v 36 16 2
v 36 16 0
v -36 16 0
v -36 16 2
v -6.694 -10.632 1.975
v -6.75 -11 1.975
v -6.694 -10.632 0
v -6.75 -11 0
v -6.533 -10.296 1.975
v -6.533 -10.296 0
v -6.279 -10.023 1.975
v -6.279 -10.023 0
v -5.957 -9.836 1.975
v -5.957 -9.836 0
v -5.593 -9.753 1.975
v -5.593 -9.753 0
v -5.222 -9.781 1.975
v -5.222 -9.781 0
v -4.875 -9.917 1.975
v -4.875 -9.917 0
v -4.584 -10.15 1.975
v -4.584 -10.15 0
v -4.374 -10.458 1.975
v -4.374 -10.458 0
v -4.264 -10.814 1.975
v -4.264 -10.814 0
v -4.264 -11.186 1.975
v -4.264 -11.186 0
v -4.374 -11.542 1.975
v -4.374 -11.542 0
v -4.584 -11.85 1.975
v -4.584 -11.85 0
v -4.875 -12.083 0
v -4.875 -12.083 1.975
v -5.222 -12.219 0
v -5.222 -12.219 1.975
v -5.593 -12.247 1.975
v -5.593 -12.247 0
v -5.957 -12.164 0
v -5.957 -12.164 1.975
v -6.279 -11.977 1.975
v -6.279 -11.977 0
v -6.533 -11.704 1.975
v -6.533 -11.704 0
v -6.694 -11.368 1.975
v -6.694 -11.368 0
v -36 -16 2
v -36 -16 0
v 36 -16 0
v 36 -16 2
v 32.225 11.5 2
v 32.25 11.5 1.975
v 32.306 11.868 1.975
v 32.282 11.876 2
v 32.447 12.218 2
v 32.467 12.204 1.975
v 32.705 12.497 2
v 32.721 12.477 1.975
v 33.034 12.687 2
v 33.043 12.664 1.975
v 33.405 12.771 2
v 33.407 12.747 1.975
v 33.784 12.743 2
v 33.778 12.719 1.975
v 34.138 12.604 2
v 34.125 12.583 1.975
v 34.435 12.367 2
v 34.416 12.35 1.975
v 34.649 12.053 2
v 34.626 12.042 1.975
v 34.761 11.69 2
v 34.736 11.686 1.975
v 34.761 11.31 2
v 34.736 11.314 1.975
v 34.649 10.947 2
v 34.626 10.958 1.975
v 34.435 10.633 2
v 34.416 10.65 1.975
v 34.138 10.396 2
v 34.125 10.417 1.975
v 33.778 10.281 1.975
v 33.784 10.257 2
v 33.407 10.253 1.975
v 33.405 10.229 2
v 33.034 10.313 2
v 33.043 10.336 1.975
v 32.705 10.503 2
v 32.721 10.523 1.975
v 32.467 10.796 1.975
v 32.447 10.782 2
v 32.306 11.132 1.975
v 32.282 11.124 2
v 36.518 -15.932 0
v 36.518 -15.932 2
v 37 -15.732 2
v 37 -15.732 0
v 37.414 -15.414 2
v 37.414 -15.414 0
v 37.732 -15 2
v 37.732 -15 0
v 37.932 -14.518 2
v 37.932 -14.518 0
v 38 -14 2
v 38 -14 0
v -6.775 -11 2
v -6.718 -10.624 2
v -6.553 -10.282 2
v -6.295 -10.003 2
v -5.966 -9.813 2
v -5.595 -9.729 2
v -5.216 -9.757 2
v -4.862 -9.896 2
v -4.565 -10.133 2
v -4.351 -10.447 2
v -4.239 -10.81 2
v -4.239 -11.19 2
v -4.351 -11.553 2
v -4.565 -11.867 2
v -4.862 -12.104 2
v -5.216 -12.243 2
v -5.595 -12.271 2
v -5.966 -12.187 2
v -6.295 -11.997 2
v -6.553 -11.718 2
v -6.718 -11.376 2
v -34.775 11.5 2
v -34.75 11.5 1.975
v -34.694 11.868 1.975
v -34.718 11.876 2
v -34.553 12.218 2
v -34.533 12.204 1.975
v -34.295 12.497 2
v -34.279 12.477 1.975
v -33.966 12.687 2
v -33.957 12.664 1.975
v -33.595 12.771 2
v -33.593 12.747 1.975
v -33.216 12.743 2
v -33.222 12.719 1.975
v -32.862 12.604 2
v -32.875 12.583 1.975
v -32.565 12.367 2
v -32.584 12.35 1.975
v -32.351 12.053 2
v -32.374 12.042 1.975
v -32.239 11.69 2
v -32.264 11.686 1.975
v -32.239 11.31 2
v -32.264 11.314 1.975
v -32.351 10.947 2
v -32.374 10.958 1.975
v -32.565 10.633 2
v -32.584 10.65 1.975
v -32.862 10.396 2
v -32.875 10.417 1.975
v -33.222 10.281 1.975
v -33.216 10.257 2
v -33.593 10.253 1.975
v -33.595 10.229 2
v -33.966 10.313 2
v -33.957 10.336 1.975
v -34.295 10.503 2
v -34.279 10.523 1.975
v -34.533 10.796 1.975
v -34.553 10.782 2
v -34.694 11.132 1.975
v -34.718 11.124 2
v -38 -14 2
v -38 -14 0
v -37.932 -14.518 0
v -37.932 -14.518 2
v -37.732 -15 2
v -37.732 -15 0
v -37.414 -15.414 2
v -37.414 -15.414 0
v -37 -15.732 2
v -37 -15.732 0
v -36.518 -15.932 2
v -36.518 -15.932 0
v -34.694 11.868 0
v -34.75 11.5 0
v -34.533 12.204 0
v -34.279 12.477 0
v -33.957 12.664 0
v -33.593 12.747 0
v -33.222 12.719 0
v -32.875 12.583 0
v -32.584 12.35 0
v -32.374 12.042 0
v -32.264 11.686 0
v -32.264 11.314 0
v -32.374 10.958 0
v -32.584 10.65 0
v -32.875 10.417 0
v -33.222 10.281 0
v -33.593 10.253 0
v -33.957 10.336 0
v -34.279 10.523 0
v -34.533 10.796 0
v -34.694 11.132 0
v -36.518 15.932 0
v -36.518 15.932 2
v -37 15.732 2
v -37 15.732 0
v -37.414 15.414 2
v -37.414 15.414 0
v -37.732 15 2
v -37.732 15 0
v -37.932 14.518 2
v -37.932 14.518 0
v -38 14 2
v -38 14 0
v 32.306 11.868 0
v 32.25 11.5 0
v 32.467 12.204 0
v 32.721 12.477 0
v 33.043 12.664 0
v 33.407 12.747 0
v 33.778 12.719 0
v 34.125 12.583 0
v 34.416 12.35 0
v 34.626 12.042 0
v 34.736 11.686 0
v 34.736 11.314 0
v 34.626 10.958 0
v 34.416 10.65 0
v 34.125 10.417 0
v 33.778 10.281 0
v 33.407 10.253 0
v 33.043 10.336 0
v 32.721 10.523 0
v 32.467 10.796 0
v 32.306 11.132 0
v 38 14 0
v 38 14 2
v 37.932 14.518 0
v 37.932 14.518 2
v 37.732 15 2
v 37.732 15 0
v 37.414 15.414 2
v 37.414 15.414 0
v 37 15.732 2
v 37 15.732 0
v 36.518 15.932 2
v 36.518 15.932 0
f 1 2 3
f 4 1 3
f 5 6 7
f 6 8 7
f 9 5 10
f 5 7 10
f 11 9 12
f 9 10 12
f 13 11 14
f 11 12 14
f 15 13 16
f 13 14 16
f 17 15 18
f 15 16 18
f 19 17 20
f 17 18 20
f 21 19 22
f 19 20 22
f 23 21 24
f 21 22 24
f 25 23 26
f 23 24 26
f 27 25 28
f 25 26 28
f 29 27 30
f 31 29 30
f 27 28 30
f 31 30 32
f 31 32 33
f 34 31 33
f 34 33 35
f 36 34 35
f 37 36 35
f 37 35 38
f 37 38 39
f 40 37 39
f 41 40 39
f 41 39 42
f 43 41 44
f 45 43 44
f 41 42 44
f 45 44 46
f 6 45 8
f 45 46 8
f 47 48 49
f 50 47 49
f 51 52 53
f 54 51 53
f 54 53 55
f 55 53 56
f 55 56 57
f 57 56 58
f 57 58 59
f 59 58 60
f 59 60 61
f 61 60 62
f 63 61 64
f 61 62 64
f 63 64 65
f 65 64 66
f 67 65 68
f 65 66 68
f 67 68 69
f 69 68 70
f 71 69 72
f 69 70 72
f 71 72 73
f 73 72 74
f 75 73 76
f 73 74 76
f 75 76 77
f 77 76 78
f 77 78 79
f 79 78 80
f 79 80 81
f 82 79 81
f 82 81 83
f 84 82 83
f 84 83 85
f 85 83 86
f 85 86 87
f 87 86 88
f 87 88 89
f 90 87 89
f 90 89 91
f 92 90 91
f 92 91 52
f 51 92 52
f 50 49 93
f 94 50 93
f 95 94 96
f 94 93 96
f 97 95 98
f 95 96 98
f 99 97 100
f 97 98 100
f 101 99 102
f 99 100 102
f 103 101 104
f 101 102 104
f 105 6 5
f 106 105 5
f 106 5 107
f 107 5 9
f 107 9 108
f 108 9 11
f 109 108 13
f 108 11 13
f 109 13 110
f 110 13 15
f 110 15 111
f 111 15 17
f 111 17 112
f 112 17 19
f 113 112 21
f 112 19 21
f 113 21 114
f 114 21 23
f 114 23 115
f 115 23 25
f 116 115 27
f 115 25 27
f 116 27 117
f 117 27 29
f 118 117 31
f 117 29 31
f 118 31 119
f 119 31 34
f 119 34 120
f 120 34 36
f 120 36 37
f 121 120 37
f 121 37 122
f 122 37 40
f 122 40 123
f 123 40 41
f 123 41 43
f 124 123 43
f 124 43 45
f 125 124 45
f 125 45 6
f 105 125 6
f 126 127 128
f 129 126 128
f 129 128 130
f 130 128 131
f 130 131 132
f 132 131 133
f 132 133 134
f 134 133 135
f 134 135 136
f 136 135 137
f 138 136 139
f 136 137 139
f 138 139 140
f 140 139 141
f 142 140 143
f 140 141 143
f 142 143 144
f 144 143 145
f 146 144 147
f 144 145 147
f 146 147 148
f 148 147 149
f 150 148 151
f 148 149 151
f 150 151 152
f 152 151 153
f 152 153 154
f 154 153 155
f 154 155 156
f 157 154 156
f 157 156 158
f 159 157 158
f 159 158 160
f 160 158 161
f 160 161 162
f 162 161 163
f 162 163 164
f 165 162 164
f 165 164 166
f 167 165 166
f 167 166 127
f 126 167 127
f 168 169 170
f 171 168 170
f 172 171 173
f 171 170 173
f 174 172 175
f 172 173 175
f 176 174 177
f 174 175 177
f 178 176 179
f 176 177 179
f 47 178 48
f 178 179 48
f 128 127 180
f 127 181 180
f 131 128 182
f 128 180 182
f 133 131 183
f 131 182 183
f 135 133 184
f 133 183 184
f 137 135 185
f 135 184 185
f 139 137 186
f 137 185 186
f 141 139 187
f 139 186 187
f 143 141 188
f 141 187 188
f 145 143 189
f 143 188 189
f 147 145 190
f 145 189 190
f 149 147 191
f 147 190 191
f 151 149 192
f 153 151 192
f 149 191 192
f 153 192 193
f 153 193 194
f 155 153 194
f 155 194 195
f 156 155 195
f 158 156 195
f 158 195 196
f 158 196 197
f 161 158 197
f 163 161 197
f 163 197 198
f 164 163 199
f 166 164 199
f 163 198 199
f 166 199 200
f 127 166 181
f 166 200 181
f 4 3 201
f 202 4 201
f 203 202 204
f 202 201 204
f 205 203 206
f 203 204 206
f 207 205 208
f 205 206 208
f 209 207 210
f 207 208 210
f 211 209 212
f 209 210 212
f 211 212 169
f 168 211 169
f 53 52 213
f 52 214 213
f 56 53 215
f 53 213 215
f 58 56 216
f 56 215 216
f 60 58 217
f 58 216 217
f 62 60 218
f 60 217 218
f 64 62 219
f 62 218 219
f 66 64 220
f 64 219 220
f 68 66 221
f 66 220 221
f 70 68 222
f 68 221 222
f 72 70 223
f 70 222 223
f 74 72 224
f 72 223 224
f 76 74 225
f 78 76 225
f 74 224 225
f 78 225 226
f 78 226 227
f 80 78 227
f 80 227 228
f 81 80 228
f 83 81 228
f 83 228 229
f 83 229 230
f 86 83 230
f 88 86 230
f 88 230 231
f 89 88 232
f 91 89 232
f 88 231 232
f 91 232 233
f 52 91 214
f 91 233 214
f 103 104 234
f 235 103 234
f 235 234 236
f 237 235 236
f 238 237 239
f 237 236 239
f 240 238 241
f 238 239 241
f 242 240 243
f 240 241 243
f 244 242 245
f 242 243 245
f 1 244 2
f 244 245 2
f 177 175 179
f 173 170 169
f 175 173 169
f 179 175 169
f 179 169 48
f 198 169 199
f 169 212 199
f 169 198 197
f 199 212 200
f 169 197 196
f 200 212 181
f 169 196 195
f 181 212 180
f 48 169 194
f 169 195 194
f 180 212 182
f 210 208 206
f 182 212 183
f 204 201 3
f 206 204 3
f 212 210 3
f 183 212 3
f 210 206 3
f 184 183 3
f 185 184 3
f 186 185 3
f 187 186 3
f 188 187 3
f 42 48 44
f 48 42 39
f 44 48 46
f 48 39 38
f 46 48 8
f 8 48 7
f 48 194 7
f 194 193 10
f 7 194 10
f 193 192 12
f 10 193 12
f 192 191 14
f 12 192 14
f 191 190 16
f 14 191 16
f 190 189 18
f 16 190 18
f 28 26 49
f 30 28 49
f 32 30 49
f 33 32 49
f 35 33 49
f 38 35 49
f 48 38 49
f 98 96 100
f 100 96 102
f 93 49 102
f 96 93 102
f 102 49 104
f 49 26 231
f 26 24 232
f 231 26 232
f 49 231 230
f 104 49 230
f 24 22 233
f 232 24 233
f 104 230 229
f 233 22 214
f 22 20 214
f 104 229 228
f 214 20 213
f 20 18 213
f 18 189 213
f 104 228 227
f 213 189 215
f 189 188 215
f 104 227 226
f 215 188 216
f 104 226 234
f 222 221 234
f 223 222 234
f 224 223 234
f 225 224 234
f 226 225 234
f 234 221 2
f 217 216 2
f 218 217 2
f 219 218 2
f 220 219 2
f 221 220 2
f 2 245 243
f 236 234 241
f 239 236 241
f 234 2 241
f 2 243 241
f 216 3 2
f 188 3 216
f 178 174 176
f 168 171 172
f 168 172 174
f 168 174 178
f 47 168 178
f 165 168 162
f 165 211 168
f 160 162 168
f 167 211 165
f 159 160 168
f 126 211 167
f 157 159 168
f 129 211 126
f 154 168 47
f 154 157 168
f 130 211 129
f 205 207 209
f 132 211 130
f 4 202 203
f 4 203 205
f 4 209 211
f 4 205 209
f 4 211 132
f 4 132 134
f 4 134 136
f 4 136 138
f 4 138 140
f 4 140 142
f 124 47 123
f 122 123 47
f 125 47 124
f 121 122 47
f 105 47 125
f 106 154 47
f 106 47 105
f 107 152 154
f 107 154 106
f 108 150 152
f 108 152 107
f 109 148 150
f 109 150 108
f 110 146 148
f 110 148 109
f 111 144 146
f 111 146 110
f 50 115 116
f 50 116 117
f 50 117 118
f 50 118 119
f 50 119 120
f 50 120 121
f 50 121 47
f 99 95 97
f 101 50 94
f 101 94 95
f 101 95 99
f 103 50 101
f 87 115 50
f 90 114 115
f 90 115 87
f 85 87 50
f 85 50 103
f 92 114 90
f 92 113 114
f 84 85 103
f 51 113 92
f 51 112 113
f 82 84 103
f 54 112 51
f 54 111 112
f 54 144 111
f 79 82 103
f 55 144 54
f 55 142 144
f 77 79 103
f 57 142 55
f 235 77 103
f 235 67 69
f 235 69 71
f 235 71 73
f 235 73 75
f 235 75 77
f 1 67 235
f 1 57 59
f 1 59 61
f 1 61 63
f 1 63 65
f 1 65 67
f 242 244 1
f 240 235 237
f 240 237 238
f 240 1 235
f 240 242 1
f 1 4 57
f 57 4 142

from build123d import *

# Parameters (mm, degrees)
BOSS_EXTRUDE1_DEPTH               = 2
TAP_DRILL_FOR_M3_TAP1_D           = 2.5
TAP_DRILL_FOR_M3_TAP1_CSINK_D     = 2.55
TAP_DRILL_FOR_M3_TAP1_CSINK_ANGLE = 90


with BuildPart() as part:
    # Model → Boss-Extrude1 (new body)
    with BuildSketch(Plane.XY):
        with BuildLine():
            Line((-38, 14), (-38, -14))
            ThreePointArc((-38, -14), (-37.414213562, -15.414213562), (-36, -16))
            Line((-36, -16), (36, -16))
            ThreePointArc((36, -16), (37.414213562, -15.414213562), (38, -14))
            Line((38, -14), (38, 14))
            ThreePointArc((38, 14), (37.414213562, 15.414213562), (36, 16))
            Line((36, 16), (-36, 16))
            ThreePointArc((-36, 16), (-37.414213562, 15.414213562), (-38, 14))
        make_face()
    extrude(amount=BOSS_EXTRUDE1_DEPTH)

    # Tap Drill for M3 Tap1 (through all)
    with Locations(Plane.XY.offset(2)):
        with Locations((-33.5, 11.5), (-5.5, -11), (33.5, 11.5)):
            CounterSinkHole(TAP_DRILL_FOR_M3_TAP1_D / 2, TAP_DRILL_FOR_M3_TAP1_CSINK_D / 2, counter_sink_angle=TAP_DRILL_FOR_M3_TAP1_CSINK_ANGLE)


solid = part.part
